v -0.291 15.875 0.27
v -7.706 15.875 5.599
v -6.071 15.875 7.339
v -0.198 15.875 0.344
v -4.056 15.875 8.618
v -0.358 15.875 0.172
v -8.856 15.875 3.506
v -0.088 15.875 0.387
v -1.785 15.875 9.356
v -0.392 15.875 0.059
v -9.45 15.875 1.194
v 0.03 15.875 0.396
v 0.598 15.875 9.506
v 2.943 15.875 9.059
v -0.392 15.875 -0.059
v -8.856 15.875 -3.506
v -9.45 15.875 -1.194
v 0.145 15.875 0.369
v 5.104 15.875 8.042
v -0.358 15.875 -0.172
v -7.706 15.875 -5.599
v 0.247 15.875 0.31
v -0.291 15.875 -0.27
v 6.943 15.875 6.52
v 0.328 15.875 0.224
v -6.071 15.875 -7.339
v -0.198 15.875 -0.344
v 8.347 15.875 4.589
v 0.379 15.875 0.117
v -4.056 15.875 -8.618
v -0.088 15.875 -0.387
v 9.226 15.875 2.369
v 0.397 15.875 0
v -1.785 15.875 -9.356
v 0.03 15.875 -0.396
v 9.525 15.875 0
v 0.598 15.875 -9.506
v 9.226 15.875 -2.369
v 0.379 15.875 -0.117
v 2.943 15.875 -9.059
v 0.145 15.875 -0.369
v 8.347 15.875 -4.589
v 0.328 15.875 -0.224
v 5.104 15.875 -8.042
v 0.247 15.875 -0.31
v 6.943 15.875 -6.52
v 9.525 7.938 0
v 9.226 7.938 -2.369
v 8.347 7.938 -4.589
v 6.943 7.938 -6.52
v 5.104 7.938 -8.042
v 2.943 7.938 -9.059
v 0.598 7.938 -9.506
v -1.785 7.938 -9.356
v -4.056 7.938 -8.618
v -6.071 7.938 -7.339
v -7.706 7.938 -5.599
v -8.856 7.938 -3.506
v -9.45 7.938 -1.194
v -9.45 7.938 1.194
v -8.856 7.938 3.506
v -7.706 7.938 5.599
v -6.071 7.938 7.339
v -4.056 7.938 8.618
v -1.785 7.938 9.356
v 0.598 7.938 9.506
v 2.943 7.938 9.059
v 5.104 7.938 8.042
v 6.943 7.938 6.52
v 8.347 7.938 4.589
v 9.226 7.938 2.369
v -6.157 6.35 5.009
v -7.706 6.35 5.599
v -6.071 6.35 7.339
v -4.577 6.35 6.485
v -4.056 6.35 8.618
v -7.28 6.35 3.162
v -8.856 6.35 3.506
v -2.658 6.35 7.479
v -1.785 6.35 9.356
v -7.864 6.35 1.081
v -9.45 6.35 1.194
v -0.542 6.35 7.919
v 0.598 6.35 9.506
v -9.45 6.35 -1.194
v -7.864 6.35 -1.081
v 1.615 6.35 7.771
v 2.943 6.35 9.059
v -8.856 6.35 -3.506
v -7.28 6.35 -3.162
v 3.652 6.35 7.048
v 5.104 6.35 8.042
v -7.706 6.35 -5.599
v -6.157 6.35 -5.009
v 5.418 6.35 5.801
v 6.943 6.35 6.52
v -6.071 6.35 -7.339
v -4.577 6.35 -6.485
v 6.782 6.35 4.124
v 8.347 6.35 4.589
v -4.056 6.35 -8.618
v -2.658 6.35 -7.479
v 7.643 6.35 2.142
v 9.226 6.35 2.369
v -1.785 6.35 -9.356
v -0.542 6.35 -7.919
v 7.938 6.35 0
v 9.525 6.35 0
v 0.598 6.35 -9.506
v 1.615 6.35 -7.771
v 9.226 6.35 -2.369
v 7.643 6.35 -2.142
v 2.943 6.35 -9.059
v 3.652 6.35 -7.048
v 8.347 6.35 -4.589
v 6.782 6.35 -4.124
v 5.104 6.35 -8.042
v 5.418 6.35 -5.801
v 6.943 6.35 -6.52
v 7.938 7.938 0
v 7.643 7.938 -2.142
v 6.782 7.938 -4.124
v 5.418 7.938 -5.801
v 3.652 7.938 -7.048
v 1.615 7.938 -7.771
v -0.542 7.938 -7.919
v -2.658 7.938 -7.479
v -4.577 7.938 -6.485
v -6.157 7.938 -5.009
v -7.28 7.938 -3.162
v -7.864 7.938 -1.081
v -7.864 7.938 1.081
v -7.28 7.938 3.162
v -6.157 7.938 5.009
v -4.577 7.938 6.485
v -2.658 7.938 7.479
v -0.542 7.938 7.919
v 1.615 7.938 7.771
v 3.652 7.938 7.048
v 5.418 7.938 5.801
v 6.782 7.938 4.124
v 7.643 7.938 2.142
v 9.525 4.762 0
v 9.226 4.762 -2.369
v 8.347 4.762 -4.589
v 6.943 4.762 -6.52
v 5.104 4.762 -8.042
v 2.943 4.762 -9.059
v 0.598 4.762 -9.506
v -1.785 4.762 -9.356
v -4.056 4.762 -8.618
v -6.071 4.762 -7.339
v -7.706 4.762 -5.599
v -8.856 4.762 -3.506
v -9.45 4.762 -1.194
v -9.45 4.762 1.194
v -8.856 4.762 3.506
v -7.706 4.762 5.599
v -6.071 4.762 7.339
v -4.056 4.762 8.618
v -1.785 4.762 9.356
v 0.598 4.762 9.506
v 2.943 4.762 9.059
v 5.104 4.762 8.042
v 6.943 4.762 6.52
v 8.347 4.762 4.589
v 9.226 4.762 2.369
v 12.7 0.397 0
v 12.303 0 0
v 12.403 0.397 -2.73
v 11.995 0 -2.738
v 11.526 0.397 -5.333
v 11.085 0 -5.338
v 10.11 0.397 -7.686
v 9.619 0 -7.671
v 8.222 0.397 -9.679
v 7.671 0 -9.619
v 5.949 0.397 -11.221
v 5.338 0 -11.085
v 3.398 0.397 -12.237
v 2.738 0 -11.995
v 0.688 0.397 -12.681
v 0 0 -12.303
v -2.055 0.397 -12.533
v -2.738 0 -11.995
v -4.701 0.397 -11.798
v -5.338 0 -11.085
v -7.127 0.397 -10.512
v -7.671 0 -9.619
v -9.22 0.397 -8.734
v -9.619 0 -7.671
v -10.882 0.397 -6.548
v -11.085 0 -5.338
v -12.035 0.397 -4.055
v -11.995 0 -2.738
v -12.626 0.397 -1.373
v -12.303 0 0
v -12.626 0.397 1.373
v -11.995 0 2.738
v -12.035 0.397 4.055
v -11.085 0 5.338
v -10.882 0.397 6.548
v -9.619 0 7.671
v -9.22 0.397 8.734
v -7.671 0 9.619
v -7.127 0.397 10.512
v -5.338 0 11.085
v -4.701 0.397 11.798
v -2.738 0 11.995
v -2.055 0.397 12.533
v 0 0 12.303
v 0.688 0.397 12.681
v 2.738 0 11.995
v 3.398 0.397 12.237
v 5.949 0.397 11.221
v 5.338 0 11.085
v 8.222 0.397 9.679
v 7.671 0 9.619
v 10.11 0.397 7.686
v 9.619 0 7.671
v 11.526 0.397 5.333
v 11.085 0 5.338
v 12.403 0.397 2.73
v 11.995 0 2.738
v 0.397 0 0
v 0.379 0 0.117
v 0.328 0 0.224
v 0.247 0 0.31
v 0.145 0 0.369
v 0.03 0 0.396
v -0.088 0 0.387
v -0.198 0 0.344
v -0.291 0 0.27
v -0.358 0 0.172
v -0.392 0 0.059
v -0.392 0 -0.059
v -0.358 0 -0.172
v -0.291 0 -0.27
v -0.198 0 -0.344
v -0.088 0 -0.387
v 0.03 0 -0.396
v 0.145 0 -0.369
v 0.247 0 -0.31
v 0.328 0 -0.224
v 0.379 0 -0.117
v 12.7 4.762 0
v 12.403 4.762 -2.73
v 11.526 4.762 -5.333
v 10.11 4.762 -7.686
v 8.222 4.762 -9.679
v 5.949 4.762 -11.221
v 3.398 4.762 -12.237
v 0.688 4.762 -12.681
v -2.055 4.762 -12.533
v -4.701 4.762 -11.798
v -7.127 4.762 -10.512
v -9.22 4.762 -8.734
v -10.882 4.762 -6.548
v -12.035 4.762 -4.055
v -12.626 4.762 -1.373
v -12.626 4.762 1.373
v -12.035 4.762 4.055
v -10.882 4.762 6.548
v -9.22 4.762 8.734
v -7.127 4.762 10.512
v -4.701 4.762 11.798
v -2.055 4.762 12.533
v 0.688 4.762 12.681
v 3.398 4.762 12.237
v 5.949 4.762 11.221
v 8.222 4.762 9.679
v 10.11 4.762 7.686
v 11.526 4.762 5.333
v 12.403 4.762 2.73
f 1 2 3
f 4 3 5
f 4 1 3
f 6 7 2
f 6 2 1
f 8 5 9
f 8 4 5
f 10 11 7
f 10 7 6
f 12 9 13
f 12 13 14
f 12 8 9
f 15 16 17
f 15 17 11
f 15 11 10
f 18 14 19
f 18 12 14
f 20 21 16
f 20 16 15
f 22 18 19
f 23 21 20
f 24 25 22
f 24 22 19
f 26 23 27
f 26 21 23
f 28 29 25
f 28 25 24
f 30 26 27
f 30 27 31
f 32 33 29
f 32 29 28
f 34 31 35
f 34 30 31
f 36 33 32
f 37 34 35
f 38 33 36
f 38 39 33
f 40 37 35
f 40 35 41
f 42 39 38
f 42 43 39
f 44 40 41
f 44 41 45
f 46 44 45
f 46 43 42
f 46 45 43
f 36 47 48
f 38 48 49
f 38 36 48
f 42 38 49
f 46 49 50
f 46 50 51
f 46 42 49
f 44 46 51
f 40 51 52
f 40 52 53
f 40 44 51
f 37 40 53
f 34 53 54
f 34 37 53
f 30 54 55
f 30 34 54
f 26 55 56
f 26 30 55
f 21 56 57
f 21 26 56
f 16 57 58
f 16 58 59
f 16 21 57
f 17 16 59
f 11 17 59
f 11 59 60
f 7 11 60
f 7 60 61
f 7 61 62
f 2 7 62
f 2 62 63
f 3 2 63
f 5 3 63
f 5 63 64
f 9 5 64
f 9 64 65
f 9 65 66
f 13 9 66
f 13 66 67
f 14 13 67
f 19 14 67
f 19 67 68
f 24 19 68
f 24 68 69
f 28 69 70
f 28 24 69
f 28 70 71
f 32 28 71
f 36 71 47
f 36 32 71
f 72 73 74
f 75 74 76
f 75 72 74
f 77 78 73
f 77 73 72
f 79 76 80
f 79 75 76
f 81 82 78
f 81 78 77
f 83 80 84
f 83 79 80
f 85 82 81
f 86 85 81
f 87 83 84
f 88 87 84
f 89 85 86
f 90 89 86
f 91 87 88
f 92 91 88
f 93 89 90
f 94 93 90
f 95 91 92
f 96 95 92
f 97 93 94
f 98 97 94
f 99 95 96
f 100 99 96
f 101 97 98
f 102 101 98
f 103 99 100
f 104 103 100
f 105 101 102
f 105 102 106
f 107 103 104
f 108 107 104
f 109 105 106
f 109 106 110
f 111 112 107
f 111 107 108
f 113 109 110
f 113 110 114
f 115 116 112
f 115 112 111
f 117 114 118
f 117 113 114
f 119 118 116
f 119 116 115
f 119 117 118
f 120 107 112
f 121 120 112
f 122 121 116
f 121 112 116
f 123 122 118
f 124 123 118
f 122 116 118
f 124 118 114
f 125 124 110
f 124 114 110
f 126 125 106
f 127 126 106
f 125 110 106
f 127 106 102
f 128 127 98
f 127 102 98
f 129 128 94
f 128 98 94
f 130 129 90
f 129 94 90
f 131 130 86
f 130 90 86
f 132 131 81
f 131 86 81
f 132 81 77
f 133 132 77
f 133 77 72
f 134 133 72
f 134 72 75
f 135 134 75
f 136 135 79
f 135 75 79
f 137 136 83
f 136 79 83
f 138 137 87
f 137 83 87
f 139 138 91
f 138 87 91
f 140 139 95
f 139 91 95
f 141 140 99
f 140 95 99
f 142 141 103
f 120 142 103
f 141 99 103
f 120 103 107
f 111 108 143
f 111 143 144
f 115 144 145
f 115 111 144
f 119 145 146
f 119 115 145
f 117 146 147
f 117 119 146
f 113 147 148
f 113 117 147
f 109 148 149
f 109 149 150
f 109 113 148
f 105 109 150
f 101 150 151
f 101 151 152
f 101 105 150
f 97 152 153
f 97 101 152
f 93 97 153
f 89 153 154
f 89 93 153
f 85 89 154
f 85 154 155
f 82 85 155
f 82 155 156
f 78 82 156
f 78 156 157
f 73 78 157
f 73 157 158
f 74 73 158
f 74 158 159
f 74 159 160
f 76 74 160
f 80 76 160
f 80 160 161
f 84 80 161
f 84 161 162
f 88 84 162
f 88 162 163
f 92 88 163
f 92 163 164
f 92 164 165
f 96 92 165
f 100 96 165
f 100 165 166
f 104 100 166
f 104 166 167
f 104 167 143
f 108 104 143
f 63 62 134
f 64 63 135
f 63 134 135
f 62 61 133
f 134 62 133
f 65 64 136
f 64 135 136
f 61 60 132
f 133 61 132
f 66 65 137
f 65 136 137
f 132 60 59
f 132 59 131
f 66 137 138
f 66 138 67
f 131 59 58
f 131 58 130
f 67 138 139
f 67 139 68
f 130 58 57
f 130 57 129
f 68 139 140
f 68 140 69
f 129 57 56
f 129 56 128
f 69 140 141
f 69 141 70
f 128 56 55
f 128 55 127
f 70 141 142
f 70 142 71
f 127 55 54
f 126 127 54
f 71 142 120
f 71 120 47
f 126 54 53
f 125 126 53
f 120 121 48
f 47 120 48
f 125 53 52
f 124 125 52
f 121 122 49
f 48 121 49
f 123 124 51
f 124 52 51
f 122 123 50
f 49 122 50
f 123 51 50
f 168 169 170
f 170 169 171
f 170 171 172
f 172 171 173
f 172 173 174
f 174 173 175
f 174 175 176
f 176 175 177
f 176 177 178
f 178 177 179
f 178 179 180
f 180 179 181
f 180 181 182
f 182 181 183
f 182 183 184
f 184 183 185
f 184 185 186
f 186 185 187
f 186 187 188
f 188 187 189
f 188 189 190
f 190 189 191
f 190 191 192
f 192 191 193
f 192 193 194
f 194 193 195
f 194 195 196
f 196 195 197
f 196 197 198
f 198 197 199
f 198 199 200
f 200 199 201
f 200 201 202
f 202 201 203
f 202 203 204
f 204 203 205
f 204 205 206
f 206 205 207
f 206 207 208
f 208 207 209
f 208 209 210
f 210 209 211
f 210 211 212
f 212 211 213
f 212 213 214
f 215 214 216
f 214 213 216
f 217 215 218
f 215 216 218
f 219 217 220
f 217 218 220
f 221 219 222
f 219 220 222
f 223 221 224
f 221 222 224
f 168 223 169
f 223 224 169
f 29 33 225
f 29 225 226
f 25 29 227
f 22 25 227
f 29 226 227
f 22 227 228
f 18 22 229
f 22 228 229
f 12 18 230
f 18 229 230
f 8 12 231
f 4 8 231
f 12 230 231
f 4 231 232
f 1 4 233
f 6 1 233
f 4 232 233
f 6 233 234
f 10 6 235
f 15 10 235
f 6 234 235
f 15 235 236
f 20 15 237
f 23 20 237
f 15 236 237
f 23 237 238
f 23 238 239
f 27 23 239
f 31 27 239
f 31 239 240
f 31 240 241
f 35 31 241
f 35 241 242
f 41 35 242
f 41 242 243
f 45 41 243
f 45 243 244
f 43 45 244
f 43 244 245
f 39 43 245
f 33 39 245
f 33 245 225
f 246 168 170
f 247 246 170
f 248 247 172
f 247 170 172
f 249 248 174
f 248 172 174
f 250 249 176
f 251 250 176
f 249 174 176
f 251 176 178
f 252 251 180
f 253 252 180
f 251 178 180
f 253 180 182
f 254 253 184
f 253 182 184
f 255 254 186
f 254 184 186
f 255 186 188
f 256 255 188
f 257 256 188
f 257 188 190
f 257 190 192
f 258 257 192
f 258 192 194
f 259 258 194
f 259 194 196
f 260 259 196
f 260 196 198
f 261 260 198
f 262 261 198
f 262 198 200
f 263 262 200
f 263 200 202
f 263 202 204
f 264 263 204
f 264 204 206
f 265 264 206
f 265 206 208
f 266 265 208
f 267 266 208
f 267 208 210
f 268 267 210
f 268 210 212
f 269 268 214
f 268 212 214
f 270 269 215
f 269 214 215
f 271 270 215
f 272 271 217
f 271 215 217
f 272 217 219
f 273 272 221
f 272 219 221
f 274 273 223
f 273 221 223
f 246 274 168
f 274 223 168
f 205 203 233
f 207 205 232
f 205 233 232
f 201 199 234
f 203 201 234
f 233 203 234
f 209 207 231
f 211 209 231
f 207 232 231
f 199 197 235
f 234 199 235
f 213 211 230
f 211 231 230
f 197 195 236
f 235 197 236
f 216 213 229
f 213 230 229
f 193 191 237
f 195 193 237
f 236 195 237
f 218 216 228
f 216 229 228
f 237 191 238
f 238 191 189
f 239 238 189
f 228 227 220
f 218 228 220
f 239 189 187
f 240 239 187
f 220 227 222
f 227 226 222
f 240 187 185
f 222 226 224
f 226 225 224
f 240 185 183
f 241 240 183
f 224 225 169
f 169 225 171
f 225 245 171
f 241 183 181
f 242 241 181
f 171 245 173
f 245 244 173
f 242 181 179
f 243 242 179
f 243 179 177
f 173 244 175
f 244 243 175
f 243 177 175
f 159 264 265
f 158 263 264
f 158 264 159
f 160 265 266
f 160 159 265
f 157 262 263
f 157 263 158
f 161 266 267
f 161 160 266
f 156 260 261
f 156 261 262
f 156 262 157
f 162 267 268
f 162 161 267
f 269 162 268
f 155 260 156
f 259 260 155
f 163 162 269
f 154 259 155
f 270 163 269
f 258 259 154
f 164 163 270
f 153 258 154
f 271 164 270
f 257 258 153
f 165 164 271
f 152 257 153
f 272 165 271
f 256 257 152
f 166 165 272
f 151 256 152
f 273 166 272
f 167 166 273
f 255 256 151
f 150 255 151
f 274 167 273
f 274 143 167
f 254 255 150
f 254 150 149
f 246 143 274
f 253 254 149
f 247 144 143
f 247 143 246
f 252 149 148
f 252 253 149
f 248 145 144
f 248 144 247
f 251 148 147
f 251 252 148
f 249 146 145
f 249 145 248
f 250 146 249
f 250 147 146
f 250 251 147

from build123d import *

# Parameters (mm, degrees)
SKETCH1_R           = 12.7
BOSS_EXTRUDE1_DEPTH = 15.875
SKETCH2_R           = 12.7
SKETCH2_R_2         = 9.525
CUT_EXTRUDE1_DEPTH  = 11.1125
SKETCH3_R           = 0.396875
CUT_EXTRUDE2_DEPTH  = 16.875
CHAMFER1_SIZE       = 0.396875
SKETCH4_R           = 9.525
SKETCH4_R_2         = 7.9375
CUT_EXTRUDE3_DEPTH  = 1.5875


with BuildPart() as part:
    # Sketch1 → Boss-Extrude1 (new body)
    with BuildSketch(Plane(origin=(0, 0, 0), x_dir=(1, 0, 0), z_dir=(0, 1, 0))):
        Circle(SKETCH1_R)
    extrude(amount=BOSS_EXTRUDE1_DEPTH)

    # Sketch2 → Cut-Extrude1 (cut)
    with BuildSketch(Plane(origin=(0, 15.875, 0), x_dir=(1, 0, 0), z_dir=(0, 1, 0))):
        Circle(SKETCH2_R)
        Circle(SKETCH2_R_2, mode=Mode.SUBTRACT)
    extrude(amount=-CUT_EXTRUDE1_DEPTH, mode=Mode.SUBTRACT)

    # Sketch3 → Cut-Extrude2 (cut, through all)
    with BuildSketch(Plane.XZ):
        Circle(SKETCH3_R)
    extrude(amount=-CUT_EXTRUDE2_DEPTH, mode=Mode.SUBTRACT)

    # Chamfer1
    chamfer1_edges = [part.edges().sort_by_distance(p)[0] for p in [
        (-12.7, 0, 0),
    ]]
    chamfer(chamfer1_edges, length=CHAMFER1_SIZE)

    # Sketch4 → Cut-Extrude3 (cut)
    with BuildSketch(Plane(origin=(0, 6.35, 0), x_dir=(1, 0, 0), z_dir=(0, 1, 0))):
        Circle(SKETCH4_R)
        Circle(SKETCH4_R_2, mode=Mode.SUBTRACT)
    extrude(amount=CUT_EXTRUDE3_DEPTH, mode=Mode.SUBTRACT)


solid = part.part
